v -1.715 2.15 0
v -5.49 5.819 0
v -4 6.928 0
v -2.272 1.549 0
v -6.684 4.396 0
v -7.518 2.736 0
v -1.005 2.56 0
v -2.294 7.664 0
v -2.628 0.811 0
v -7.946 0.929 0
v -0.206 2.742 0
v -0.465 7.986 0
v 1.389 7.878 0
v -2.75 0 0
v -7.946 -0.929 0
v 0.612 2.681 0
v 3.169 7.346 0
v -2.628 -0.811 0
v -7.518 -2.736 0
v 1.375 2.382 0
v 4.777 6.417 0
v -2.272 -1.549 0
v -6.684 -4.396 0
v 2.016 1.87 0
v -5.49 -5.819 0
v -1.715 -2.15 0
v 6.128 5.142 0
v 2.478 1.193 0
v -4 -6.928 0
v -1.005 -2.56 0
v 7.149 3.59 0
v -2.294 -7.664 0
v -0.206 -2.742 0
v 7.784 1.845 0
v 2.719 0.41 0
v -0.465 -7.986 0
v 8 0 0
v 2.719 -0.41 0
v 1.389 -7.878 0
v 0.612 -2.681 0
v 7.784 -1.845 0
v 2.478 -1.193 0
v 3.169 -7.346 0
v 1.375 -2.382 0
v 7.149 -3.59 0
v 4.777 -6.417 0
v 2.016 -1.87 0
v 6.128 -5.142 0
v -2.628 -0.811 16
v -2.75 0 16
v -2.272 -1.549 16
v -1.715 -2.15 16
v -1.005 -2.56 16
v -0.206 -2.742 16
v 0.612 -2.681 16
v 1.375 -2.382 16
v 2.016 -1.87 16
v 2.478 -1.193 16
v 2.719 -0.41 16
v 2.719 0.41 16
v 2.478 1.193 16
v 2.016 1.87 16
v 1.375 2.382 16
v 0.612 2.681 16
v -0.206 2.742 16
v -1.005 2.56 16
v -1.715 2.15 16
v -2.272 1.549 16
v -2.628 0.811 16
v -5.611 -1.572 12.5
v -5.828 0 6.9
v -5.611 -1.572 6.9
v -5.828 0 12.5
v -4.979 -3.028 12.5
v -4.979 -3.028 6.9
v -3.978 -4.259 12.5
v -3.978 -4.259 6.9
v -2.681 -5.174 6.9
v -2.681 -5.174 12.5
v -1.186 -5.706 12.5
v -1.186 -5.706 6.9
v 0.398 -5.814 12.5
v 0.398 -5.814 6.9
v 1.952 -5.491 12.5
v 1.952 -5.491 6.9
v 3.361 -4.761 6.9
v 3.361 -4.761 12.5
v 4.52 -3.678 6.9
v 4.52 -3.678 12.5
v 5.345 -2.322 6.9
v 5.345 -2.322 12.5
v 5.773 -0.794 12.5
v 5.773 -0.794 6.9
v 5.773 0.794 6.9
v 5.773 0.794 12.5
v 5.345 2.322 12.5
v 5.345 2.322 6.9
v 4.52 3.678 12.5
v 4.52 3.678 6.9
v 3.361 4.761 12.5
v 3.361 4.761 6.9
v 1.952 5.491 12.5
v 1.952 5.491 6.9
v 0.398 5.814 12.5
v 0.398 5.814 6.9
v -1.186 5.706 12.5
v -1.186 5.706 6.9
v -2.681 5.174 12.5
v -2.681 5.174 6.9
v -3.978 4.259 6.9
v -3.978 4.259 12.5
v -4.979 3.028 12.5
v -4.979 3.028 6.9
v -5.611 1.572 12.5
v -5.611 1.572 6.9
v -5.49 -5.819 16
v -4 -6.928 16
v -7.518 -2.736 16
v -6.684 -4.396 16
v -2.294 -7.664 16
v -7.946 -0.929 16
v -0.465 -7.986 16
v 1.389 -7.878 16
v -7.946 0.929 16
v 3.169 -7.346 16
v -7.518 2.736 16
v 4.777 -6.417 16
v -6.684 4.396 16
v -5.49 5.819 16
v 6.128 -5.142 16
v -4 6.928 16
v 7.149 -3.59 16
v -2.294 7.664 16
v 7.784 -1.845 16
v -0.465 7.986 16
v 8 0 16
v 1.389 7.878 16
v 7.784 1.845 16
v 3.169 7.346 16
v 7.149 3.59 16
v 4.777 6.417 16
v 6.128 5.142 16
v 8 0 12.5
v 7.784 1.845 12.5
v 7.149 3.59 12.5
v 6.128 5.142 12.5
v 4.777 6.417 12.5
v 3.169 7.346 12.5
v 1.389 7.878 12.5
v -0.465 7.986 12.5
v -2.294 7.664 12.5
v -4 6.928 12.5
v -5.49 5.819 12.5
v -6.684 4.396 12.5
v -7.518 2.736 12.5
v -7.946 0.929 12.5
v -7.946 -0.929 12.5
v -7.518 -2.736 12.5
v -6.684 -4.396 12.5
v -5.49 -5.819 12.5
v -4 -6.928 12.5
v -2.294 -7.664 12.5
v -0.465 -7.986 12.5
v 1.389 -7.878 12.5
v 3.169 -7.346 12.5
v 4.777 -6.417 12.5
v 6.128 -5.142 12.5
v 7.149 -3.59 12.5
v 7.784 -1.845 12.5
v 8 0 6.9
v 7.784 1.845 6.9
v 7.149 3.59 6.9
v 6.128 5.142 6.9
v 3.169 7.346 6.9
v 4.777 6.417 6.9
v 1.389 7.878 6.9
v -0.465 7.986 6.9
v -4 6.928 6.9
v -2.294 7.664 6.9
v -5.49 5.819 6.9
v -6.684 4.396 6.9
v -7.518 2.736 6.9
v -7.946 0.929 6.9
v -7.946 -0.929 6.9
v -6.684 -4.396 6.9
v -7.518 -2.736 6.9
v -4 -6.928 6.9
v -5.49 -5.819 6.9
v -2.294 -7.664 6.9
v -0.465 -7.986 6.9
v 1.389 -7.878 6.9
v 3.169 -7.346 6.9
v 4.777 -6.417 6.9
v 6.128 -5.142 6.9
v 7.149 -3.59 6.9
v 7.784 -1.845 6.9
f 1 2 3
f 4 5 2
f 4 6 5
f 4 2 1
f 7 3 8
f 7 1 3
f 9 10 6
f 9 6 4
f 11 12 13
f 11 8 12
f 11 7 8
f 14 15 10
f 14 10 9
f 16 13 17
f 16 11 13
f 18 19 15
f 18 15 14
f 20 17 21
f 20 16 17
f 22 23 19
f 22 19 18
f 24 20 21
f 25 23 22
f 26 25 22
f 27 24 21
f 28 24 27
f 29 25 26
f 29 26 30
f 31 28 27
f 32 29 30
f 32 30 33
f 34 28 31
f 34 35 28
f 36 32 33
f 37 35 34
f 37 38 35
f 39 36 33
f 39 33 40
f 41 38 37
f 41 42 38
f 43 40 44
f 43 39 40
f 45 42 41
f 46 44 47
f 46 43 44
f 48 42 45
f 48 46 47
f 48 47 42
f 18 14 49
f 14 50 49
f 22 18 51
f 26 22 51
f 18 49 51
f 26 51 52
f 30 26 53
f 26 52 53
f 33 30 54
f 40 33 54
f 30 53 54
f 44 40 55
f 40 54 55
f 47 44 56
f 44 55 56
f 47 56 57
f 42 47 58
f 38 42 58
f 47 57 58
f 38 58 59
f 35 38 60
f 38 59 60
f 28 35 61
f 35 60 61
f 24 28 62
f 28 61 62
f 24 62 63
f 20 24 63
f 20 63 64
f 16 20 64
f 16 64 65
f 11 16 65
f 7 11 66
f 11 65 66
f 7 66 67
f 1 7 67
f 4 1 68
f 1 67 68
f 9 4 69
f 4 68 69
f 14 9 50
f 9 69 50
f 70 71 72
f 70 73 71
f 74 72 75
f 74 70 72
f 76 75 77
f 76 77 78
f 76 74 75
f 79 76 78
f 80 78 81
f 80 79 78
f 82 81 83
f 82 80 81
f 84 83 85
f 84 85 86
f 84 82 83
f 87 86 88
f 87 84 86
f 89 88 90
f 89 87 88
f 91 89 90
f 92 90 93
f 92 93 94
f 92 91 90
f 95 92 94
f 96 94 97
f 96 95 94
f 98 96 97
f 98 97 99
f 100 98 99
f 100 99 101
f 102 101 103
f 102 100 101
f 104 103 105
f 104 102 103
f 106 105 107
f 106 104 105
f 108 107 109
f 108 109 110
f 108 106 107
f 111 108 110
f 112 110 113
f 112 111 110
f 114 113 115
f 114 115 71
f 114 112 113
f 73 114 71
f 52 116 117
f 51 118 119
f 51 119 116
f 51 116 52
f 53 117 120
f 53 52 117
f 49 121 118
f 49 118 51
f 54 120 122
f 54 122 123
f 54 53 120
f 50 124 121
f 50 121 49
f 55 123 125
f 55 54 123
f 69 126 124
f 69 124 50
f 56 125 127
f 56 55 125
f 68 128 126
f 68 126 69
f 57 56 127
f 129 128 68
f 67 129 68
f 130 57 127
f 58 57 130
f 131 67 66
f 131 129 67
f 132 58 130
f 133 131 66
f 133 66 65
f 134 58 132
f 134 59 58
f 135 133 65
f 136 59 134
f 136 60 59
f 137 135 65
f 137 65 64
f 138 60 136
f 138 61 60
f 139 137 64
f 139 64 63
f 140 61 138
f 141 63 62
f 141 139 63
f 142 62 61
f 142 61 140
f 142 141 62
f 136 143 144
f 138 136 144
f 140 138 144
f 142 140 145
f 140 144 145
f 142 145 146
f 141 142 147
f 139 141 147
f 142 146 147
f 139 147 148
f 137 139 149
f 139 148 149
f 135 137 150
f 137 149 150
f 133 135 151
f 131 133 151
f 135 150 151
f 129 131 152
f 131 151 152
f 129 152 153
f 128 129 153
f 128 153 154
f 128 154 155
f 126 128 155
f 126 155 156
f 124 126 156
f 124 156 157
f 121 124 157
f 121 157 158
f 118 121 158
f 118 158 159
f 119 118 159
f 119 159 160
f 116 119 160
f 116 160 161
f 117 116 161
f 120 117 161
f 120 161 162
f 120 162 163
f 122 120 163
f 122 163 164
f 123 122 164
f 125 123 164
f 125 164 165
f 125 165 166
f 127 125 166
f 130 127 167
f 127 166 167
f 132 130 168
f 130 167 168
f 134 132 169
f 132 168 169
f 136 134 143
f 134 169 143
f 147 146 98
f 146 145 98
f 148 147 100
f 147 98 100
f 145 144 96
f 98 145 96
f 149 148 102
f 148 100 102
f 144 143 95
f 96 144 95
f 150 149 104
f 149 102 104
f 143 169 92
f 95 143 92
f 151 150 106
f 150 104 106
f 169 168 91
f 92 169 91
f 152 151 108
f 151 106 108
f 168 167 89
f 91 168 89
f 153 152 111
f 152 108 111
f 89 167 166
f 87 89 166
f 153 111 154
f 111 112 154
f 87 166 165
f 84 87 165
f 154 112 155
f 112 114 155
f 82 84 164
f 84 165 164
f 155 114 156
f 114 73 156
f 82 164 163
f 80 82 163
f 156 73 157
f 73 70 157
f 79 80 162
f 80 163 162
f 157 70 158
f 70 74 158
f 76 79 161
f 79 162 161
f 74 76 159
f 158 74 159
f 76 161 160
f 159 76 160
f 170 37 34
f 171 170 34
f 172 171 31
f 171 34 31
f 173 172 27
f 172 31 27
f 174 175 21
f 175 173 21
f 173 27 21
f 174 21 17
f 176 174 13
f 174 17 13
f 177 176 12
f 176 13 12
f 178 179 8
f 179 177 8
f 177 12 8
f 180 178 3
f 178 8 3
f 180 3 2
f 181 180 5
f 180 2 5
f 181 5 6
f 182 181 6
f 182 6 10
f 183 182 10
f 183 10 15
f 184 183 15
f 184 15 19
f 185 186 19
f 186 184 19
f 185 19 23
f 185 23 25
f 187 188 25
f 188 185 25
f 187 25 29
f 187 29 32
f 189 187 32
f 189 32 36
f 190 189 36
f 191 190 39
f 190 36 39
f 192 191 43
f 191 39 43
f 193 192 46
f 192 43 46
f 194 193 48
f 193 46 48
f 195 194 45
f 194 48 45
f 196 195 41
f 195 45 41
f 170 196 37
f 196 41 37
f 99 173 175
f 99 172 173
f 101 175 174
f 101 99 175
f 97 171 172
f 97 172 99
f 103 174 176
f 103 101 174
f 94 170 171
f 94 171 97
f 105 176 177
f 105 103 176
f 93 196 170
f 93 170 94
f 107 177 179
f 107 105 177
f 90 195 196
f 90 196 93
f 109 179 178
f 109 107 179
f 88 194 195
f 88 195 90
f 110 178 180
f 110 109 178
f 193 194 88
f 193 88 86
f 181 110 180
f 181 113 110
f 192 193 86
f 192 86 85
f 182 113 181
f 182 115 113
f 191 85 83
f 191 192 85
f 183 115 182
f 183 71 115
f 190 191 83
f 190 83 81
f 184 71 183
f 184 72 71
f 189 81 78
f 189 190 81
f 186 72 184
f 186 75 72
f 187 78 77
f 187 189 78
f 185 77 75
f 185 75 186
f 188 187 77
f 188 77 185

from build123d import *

# Parameters (mm, degrees)
F0_W           = 30
F0_H           = 24
F1_DEPTH       = 3
F2_D           = 3.3
F3_R           = 8
F4_DEPTH       = 16
F6_W           = 2.2
F6_H           = 5.6
F10_D          = 5.5
F11_R          = 5
F12_W          = 35.0341517478
F12_H          = 6.4177829772
F13_DEPTH      = 25
F13_DEPTH_BACK = 25


with BuildPart() as f1:
    # F0 (on Top) → F1 (new body)
    with BuildSketch(Plane.XY):
        Rectangle(F0_W, F0_H)
    extrude(amount=-F1_DEPTH)

    # F2 (through all)
    with Locations(Plane.XY):
        with Locations((-9, 6.7), (9, 6.7)):
            Hole(F2_D / 2)

    # F3 (on face) → F4 (join)
    with BuildSketch(Plane.XY):
        Circle(F3_R)
    extrude(amount=F4_DEPTH)

    # F6 (on Front) → F8 (revolve, cut)
    with BuildSketch(Plane.XZ):
        with Locations((-6.9275095962, 9.7)):
            Rectangle(F6_W, F6_H)
    revolve(axis=Axis((0, 0, 17.9499220103), (0, 0, 1)), mode=Mode.SUBTRACT)

    # F10 (through all)
    with Locations(Plane(origin=(0, 0, -3), x_dir=(1, 0, 0), z_dir=(0, 0, -1))):
        with Locations((0, 0)):
            Hole(F10_D / 2)

    # F11
    f11_edges = [f1.edges().sort_by_distance(p)[0] for p in [
        (15, -12, -1.5),
        (15, 12, -1.5),
        (-15, 12, -1.5),
        (-15, -12, -1.5),
    ]]
    fillet(f11_edges, radius=F11_R)

    # F12 (on Front) → F13 (cut, two sides)
    with BuildSketch(Plane.XZ) as f13_sk:
        with Locations((-0.1057451591, -3.2088914886)):
            Rectangle(F12_W, F12_H)
    extrude(amount=-F13_DEPTH, mode=Mode.SUBTRACT)
    extrude(f13_sk.sketch, amount=F13_DEPTH_BACK, mode=Mode.SUBTRACT)


solid = f1.part
